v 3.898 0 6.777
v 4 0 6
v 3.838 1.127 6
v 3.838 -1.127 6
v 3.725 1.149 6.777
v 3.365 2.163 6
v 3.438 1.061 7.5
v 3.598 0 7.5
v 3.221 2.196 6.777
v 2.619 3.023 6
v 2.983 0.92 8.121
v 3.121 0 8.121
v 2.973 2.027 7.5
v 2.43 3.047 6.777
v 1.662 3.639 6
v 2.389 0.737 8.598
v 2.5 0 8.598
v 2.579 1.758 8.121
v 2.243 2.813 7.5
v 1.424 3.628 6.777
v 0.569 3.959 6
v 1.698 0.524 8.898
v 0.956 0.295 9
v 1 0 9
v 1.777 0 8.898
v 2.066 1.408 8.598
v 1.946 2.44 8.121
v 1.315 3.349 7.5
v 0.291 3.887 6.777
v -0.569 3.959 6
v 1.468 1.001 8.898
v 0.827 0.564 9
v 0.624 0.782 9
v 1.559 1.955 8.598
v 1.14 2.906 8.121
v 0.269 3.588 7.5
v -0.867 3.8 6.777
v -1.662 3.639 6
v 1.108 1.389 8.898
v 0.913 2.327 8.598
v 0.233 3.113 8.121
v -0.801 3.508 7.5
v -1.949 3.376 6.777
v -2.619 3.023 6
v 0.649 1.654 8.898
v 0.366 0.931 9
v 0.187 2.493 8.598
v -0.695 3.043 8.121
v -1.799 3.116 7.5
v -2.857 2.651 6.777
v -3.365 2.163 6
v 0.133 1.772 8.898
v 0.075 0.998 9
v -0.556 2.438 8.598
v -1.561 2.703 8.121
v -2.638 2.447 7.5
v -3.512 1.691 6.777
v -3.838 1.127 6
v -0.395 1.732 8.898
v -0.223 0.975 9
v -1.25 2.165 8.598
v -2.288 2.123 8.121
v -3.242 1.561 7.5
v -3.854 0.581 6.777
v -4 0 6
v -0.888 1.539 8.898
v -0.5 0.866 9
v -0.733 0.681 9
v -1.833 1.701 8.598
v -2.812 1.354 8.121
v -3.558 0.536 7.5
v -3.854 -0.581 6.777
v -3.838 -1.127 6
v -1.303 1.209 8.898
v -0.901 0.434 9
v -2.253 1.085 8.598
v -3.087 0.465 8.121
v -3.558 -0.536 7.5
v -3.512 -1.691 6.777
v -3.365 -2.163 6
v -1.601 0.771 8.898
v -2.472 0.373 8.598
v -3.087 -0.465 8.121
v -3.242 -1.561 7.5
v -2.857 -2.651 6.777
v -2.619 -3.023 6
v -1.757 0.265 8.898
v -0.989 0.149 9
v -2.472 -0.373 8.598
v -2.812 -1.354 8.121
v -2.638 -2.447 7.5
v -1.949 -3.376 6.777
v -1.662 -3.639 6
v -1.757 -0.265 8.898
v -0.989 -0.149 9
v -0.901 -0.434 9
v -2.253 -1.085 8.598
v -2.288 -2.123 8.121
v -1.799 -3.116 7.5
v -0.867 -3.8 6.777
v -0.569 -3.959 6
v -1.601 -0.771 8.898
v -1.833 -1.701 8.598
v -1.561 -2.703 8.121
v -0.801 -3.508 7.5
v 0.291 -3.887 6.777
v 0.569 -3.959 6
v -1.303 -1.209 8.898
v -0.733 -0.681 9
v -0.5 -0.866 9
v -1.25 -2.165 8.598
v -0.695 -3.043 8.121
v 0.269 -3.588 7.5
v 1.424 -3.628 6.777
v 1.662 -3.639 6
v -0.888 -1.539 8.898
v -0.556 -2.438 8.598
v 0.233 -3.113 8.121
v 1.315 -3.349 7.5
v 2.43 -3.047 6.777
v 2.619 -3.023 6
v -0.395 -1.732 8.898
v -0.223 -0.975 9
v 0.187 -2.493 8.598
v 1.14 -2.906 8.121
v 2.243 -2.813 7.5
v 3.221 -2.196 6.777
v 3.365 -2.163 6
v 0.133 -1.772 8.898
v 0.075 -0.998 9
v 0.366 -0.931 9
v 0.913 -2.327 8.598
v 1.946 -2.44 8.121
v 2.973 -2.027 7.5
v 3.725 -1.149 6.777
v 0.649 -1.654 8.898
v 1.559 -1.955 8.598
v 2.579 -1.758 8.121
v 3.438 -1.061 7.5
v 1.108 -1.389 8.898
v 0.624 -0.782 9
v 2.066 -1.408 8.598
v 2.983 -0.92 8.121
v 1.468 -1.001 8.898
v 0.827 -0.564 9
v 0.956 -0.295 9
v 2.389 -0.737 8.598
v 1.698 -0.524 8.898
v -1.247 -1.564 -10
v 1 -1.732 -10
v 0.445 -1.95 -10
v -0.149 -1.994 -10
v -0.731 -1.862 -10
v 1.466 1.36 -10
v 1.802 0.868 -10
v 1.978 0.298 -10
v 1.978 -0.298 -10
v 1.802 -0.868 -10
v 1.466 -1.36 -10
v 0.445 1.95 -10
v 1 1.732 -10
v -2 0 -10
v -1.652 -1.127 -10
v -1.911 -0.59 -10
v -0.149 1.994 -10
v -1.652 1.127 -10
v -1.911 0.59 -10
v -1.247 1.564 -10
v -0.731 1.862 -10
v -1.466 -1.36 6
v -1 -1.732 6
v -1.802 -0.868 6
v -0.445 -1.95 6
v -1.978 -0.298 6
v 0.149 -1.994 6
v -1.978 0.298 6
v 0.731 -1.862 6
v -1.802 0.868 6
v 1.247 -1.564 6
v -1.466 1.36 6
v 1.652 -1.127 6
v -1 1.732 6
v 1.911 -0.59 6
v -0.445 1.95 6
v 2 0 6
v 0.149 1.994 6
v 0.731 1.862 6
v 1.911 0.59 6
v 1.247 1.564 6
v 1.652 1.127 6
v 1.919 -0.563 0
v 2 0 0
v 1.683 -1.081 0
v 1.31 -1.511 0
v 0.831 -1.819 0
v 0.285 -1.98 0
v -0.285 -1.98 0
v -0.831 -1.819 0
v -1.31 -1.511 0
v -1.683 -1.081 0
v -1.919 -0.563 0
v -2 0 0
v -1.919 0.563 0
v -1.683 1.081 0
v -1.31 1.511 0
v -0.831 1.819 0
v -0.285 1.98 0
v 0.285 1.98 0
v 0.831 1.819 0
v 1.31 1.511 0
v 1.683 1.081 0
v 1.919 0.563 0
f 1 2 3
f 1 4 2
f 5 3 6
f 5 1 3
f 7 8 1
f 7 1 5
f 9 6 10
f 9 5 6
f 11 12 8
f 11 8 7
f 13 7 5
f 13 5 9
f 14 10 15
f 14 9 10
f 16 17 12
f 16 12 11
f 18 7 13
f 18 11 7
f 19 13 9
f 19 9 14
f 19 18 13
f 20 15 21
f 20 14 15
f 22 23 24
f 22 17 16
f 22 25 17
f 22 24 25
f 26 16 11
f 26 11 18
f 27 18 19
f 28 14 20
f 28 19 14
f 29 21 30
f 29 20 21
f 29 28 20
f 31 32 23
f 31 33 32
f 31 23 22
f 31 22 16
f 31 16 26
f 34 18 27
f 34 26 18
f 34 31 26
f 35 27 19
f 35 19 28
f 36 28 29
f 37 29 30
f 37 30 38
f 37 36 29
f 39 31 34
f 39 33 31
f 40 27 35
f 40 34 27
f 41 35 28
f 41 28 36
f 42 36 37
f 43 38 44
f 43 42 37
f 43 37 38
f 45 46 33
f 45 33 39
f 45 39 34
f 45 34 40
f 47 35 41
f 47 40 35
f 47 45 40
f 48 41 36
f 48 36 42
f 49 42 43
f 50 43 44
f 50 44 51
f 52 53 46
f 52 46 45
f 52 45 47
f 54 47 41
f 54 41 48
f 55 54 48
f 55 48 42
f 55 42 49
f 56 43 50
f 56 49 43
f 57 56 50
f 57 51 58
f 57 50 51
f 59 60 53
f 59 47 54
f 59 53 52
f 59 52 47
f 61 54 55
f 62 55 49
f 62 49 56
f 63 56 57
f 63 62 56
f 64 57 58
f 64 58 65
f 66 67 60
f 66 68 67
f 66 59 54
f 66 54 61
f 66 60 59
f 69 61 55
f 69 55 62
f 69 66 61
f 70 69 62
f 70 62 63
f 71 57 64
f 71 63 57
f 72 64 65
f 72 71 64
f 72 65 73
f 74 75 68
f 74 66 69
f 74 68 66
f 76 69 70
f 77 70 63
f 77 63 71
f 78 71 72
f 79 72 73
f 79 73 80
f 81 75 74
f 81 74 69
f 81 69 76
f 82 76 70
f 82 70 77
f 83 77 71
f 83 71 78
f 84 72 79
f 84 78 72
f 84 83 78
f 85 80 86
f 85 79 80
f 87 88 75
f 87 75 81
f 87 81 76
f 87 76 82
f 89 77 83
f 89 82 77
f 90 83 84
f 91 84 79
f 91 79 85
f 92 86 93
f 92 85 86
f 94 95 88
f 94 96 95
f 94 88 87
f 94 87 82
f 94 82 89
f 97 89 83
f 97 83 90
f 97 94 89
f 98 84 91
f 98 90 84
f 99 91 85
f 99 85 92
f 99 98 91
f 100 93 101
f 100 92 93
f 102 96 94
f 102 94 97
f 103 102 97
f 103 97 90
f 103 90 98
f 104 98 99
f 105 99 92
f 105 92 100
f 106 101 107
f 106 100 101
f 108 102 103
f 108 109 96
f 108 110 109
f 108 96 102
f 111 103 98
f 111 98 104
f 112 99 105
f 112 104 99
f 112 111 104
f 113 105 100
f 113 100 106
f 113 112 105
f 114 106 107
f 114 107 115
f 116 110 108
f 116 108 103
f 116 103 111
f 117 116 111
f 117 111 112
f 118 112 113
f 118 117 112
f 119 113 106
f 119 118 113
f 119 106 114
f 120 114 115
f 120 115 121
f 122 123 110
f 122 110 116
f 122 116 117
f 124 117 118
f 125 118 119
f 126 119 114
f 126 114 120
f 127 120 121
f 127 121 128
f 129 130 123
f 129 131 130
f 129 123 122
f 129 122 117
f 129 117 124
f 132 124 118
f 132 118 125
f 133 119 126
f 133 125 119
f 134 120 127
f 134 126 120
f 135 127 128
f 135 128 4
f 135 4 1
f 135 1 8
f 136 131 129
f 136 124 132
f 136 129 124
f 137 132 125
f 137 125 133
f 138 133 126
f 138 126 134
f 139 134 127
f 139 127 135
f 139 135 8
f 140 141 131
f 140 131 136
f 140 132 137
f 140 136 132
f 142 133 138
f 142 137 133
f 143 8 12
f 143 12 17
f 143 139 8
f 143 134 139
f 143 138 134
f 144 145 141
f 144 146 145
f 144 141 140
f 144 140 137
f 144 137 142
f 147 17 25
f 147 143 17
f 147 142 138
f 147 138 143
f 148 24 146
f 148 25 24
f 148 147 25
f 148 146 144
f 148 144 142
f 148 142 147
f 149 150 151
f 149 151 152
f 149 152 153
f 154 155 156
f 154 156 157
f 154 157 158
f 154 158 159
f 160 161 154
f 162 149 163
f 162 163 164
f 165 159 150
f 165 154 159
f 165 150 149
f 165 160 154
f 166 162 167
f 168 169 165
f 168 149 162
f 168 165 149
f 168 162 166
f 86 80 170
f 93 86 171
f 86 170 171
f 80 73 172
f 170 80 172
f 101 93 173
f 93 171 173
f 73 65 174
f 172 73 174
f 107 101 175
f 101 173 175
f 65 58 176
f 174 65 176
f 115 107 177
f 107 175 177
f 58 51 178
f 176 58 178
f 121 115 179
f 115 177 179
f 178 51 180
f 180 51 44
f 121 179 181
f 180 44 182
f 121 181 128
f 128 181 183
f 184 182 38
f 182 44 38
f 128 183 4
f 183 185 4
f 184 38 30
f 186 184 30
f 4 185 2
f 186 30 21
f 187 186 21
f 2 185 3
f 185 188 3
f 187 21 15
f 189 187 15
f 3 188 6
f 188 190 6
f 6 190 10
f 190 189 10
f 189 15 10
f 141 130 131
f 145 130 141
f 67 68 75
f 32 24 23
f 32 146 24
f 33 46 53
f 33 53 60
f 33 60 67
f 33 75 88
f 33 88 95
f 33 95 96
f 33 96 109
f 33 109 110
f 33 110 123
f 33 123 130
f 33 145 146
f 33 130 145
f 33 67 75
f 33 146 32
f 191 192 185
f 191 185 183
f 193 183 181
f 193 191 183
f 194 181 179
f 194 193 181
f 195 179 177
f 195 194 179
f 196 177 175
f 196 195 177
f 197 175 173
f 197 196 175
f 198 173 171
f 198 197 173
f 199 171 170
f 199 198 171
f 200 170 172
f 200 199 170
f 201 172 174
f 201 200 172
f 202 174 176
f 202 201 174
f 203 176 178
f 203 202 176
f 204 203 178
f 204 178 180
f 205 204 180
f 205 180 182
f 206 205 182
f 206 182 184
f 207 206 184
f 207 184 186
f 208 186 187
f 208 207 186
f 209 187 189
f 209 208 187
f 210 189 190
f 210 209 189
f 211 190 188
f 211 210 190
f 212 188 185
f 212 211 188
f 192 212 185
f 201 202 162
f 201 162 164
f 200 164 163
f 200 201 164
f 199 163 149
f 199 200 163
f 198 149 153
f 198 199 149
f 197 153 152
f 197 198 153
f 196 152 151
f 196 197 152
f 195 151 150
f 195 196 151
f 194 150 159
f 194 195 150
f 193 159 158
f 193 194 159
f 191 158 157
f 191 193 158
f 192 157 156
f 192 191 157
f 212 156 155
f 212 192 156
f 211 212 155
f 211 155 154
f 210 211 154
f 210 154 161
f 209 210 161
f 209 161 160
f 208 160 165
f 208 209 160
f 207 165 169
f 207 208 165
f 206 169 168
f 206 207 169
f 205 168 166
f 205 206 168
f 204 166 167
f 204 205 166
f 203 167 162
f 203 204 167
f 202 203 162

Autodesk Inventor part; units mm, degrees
ref_plane "YZ Plane" through (0, 0, 0) normal (1, 0, 0) x (0, 1, 0)
ref_plane "XZ Plane" through (0, 0, 0) normal (0, 1, 0) x (-1, 0, 0)
ref_plane "XY Plane" through (0, 0, 0) normal (0, 0, 1) x (1, 0, 0)
sketch "スケッチ1" plane through (0, 0, 0) normal (0, 0, 1) x (1, 0, 0)
  circle A0 centre (0, 0) radius 2
  dimension "d0" = 4
extrude "押し出し1" add sketch "スケッチ1" along normal blind 6
sketch "スケッチ2" plane through (0, 0, 6) normal (0, 0, 1) x (1, 0, 0)
  circle A0 centre (0, 0) radius 2 projected
  circle A1 centre (0, 0) radius 4
  dimension "d3" = 8
extrude "押し出し2" add sketch "スケッチ2" along normal blind 3 contours A0 | A1
fillet "フィレット1" radius 3 1 edges at (-4, 0, 9)
thread "ねじ1" size "M4x0.7" class "6g" standard "ANSI Metric M Profile" full length
sketch "スケッチ3" plane through (0, 0, 0) normal (0, 0, -1) x (-1, 0, 0)
  circle A0 centre (0, 0) radius 2
extrude "押し出し3" add sketch "スケッチ3" along normal blind 10
properties part number "SB　M4 16mm なべネジ" material "Stainless Steel, 440C"
